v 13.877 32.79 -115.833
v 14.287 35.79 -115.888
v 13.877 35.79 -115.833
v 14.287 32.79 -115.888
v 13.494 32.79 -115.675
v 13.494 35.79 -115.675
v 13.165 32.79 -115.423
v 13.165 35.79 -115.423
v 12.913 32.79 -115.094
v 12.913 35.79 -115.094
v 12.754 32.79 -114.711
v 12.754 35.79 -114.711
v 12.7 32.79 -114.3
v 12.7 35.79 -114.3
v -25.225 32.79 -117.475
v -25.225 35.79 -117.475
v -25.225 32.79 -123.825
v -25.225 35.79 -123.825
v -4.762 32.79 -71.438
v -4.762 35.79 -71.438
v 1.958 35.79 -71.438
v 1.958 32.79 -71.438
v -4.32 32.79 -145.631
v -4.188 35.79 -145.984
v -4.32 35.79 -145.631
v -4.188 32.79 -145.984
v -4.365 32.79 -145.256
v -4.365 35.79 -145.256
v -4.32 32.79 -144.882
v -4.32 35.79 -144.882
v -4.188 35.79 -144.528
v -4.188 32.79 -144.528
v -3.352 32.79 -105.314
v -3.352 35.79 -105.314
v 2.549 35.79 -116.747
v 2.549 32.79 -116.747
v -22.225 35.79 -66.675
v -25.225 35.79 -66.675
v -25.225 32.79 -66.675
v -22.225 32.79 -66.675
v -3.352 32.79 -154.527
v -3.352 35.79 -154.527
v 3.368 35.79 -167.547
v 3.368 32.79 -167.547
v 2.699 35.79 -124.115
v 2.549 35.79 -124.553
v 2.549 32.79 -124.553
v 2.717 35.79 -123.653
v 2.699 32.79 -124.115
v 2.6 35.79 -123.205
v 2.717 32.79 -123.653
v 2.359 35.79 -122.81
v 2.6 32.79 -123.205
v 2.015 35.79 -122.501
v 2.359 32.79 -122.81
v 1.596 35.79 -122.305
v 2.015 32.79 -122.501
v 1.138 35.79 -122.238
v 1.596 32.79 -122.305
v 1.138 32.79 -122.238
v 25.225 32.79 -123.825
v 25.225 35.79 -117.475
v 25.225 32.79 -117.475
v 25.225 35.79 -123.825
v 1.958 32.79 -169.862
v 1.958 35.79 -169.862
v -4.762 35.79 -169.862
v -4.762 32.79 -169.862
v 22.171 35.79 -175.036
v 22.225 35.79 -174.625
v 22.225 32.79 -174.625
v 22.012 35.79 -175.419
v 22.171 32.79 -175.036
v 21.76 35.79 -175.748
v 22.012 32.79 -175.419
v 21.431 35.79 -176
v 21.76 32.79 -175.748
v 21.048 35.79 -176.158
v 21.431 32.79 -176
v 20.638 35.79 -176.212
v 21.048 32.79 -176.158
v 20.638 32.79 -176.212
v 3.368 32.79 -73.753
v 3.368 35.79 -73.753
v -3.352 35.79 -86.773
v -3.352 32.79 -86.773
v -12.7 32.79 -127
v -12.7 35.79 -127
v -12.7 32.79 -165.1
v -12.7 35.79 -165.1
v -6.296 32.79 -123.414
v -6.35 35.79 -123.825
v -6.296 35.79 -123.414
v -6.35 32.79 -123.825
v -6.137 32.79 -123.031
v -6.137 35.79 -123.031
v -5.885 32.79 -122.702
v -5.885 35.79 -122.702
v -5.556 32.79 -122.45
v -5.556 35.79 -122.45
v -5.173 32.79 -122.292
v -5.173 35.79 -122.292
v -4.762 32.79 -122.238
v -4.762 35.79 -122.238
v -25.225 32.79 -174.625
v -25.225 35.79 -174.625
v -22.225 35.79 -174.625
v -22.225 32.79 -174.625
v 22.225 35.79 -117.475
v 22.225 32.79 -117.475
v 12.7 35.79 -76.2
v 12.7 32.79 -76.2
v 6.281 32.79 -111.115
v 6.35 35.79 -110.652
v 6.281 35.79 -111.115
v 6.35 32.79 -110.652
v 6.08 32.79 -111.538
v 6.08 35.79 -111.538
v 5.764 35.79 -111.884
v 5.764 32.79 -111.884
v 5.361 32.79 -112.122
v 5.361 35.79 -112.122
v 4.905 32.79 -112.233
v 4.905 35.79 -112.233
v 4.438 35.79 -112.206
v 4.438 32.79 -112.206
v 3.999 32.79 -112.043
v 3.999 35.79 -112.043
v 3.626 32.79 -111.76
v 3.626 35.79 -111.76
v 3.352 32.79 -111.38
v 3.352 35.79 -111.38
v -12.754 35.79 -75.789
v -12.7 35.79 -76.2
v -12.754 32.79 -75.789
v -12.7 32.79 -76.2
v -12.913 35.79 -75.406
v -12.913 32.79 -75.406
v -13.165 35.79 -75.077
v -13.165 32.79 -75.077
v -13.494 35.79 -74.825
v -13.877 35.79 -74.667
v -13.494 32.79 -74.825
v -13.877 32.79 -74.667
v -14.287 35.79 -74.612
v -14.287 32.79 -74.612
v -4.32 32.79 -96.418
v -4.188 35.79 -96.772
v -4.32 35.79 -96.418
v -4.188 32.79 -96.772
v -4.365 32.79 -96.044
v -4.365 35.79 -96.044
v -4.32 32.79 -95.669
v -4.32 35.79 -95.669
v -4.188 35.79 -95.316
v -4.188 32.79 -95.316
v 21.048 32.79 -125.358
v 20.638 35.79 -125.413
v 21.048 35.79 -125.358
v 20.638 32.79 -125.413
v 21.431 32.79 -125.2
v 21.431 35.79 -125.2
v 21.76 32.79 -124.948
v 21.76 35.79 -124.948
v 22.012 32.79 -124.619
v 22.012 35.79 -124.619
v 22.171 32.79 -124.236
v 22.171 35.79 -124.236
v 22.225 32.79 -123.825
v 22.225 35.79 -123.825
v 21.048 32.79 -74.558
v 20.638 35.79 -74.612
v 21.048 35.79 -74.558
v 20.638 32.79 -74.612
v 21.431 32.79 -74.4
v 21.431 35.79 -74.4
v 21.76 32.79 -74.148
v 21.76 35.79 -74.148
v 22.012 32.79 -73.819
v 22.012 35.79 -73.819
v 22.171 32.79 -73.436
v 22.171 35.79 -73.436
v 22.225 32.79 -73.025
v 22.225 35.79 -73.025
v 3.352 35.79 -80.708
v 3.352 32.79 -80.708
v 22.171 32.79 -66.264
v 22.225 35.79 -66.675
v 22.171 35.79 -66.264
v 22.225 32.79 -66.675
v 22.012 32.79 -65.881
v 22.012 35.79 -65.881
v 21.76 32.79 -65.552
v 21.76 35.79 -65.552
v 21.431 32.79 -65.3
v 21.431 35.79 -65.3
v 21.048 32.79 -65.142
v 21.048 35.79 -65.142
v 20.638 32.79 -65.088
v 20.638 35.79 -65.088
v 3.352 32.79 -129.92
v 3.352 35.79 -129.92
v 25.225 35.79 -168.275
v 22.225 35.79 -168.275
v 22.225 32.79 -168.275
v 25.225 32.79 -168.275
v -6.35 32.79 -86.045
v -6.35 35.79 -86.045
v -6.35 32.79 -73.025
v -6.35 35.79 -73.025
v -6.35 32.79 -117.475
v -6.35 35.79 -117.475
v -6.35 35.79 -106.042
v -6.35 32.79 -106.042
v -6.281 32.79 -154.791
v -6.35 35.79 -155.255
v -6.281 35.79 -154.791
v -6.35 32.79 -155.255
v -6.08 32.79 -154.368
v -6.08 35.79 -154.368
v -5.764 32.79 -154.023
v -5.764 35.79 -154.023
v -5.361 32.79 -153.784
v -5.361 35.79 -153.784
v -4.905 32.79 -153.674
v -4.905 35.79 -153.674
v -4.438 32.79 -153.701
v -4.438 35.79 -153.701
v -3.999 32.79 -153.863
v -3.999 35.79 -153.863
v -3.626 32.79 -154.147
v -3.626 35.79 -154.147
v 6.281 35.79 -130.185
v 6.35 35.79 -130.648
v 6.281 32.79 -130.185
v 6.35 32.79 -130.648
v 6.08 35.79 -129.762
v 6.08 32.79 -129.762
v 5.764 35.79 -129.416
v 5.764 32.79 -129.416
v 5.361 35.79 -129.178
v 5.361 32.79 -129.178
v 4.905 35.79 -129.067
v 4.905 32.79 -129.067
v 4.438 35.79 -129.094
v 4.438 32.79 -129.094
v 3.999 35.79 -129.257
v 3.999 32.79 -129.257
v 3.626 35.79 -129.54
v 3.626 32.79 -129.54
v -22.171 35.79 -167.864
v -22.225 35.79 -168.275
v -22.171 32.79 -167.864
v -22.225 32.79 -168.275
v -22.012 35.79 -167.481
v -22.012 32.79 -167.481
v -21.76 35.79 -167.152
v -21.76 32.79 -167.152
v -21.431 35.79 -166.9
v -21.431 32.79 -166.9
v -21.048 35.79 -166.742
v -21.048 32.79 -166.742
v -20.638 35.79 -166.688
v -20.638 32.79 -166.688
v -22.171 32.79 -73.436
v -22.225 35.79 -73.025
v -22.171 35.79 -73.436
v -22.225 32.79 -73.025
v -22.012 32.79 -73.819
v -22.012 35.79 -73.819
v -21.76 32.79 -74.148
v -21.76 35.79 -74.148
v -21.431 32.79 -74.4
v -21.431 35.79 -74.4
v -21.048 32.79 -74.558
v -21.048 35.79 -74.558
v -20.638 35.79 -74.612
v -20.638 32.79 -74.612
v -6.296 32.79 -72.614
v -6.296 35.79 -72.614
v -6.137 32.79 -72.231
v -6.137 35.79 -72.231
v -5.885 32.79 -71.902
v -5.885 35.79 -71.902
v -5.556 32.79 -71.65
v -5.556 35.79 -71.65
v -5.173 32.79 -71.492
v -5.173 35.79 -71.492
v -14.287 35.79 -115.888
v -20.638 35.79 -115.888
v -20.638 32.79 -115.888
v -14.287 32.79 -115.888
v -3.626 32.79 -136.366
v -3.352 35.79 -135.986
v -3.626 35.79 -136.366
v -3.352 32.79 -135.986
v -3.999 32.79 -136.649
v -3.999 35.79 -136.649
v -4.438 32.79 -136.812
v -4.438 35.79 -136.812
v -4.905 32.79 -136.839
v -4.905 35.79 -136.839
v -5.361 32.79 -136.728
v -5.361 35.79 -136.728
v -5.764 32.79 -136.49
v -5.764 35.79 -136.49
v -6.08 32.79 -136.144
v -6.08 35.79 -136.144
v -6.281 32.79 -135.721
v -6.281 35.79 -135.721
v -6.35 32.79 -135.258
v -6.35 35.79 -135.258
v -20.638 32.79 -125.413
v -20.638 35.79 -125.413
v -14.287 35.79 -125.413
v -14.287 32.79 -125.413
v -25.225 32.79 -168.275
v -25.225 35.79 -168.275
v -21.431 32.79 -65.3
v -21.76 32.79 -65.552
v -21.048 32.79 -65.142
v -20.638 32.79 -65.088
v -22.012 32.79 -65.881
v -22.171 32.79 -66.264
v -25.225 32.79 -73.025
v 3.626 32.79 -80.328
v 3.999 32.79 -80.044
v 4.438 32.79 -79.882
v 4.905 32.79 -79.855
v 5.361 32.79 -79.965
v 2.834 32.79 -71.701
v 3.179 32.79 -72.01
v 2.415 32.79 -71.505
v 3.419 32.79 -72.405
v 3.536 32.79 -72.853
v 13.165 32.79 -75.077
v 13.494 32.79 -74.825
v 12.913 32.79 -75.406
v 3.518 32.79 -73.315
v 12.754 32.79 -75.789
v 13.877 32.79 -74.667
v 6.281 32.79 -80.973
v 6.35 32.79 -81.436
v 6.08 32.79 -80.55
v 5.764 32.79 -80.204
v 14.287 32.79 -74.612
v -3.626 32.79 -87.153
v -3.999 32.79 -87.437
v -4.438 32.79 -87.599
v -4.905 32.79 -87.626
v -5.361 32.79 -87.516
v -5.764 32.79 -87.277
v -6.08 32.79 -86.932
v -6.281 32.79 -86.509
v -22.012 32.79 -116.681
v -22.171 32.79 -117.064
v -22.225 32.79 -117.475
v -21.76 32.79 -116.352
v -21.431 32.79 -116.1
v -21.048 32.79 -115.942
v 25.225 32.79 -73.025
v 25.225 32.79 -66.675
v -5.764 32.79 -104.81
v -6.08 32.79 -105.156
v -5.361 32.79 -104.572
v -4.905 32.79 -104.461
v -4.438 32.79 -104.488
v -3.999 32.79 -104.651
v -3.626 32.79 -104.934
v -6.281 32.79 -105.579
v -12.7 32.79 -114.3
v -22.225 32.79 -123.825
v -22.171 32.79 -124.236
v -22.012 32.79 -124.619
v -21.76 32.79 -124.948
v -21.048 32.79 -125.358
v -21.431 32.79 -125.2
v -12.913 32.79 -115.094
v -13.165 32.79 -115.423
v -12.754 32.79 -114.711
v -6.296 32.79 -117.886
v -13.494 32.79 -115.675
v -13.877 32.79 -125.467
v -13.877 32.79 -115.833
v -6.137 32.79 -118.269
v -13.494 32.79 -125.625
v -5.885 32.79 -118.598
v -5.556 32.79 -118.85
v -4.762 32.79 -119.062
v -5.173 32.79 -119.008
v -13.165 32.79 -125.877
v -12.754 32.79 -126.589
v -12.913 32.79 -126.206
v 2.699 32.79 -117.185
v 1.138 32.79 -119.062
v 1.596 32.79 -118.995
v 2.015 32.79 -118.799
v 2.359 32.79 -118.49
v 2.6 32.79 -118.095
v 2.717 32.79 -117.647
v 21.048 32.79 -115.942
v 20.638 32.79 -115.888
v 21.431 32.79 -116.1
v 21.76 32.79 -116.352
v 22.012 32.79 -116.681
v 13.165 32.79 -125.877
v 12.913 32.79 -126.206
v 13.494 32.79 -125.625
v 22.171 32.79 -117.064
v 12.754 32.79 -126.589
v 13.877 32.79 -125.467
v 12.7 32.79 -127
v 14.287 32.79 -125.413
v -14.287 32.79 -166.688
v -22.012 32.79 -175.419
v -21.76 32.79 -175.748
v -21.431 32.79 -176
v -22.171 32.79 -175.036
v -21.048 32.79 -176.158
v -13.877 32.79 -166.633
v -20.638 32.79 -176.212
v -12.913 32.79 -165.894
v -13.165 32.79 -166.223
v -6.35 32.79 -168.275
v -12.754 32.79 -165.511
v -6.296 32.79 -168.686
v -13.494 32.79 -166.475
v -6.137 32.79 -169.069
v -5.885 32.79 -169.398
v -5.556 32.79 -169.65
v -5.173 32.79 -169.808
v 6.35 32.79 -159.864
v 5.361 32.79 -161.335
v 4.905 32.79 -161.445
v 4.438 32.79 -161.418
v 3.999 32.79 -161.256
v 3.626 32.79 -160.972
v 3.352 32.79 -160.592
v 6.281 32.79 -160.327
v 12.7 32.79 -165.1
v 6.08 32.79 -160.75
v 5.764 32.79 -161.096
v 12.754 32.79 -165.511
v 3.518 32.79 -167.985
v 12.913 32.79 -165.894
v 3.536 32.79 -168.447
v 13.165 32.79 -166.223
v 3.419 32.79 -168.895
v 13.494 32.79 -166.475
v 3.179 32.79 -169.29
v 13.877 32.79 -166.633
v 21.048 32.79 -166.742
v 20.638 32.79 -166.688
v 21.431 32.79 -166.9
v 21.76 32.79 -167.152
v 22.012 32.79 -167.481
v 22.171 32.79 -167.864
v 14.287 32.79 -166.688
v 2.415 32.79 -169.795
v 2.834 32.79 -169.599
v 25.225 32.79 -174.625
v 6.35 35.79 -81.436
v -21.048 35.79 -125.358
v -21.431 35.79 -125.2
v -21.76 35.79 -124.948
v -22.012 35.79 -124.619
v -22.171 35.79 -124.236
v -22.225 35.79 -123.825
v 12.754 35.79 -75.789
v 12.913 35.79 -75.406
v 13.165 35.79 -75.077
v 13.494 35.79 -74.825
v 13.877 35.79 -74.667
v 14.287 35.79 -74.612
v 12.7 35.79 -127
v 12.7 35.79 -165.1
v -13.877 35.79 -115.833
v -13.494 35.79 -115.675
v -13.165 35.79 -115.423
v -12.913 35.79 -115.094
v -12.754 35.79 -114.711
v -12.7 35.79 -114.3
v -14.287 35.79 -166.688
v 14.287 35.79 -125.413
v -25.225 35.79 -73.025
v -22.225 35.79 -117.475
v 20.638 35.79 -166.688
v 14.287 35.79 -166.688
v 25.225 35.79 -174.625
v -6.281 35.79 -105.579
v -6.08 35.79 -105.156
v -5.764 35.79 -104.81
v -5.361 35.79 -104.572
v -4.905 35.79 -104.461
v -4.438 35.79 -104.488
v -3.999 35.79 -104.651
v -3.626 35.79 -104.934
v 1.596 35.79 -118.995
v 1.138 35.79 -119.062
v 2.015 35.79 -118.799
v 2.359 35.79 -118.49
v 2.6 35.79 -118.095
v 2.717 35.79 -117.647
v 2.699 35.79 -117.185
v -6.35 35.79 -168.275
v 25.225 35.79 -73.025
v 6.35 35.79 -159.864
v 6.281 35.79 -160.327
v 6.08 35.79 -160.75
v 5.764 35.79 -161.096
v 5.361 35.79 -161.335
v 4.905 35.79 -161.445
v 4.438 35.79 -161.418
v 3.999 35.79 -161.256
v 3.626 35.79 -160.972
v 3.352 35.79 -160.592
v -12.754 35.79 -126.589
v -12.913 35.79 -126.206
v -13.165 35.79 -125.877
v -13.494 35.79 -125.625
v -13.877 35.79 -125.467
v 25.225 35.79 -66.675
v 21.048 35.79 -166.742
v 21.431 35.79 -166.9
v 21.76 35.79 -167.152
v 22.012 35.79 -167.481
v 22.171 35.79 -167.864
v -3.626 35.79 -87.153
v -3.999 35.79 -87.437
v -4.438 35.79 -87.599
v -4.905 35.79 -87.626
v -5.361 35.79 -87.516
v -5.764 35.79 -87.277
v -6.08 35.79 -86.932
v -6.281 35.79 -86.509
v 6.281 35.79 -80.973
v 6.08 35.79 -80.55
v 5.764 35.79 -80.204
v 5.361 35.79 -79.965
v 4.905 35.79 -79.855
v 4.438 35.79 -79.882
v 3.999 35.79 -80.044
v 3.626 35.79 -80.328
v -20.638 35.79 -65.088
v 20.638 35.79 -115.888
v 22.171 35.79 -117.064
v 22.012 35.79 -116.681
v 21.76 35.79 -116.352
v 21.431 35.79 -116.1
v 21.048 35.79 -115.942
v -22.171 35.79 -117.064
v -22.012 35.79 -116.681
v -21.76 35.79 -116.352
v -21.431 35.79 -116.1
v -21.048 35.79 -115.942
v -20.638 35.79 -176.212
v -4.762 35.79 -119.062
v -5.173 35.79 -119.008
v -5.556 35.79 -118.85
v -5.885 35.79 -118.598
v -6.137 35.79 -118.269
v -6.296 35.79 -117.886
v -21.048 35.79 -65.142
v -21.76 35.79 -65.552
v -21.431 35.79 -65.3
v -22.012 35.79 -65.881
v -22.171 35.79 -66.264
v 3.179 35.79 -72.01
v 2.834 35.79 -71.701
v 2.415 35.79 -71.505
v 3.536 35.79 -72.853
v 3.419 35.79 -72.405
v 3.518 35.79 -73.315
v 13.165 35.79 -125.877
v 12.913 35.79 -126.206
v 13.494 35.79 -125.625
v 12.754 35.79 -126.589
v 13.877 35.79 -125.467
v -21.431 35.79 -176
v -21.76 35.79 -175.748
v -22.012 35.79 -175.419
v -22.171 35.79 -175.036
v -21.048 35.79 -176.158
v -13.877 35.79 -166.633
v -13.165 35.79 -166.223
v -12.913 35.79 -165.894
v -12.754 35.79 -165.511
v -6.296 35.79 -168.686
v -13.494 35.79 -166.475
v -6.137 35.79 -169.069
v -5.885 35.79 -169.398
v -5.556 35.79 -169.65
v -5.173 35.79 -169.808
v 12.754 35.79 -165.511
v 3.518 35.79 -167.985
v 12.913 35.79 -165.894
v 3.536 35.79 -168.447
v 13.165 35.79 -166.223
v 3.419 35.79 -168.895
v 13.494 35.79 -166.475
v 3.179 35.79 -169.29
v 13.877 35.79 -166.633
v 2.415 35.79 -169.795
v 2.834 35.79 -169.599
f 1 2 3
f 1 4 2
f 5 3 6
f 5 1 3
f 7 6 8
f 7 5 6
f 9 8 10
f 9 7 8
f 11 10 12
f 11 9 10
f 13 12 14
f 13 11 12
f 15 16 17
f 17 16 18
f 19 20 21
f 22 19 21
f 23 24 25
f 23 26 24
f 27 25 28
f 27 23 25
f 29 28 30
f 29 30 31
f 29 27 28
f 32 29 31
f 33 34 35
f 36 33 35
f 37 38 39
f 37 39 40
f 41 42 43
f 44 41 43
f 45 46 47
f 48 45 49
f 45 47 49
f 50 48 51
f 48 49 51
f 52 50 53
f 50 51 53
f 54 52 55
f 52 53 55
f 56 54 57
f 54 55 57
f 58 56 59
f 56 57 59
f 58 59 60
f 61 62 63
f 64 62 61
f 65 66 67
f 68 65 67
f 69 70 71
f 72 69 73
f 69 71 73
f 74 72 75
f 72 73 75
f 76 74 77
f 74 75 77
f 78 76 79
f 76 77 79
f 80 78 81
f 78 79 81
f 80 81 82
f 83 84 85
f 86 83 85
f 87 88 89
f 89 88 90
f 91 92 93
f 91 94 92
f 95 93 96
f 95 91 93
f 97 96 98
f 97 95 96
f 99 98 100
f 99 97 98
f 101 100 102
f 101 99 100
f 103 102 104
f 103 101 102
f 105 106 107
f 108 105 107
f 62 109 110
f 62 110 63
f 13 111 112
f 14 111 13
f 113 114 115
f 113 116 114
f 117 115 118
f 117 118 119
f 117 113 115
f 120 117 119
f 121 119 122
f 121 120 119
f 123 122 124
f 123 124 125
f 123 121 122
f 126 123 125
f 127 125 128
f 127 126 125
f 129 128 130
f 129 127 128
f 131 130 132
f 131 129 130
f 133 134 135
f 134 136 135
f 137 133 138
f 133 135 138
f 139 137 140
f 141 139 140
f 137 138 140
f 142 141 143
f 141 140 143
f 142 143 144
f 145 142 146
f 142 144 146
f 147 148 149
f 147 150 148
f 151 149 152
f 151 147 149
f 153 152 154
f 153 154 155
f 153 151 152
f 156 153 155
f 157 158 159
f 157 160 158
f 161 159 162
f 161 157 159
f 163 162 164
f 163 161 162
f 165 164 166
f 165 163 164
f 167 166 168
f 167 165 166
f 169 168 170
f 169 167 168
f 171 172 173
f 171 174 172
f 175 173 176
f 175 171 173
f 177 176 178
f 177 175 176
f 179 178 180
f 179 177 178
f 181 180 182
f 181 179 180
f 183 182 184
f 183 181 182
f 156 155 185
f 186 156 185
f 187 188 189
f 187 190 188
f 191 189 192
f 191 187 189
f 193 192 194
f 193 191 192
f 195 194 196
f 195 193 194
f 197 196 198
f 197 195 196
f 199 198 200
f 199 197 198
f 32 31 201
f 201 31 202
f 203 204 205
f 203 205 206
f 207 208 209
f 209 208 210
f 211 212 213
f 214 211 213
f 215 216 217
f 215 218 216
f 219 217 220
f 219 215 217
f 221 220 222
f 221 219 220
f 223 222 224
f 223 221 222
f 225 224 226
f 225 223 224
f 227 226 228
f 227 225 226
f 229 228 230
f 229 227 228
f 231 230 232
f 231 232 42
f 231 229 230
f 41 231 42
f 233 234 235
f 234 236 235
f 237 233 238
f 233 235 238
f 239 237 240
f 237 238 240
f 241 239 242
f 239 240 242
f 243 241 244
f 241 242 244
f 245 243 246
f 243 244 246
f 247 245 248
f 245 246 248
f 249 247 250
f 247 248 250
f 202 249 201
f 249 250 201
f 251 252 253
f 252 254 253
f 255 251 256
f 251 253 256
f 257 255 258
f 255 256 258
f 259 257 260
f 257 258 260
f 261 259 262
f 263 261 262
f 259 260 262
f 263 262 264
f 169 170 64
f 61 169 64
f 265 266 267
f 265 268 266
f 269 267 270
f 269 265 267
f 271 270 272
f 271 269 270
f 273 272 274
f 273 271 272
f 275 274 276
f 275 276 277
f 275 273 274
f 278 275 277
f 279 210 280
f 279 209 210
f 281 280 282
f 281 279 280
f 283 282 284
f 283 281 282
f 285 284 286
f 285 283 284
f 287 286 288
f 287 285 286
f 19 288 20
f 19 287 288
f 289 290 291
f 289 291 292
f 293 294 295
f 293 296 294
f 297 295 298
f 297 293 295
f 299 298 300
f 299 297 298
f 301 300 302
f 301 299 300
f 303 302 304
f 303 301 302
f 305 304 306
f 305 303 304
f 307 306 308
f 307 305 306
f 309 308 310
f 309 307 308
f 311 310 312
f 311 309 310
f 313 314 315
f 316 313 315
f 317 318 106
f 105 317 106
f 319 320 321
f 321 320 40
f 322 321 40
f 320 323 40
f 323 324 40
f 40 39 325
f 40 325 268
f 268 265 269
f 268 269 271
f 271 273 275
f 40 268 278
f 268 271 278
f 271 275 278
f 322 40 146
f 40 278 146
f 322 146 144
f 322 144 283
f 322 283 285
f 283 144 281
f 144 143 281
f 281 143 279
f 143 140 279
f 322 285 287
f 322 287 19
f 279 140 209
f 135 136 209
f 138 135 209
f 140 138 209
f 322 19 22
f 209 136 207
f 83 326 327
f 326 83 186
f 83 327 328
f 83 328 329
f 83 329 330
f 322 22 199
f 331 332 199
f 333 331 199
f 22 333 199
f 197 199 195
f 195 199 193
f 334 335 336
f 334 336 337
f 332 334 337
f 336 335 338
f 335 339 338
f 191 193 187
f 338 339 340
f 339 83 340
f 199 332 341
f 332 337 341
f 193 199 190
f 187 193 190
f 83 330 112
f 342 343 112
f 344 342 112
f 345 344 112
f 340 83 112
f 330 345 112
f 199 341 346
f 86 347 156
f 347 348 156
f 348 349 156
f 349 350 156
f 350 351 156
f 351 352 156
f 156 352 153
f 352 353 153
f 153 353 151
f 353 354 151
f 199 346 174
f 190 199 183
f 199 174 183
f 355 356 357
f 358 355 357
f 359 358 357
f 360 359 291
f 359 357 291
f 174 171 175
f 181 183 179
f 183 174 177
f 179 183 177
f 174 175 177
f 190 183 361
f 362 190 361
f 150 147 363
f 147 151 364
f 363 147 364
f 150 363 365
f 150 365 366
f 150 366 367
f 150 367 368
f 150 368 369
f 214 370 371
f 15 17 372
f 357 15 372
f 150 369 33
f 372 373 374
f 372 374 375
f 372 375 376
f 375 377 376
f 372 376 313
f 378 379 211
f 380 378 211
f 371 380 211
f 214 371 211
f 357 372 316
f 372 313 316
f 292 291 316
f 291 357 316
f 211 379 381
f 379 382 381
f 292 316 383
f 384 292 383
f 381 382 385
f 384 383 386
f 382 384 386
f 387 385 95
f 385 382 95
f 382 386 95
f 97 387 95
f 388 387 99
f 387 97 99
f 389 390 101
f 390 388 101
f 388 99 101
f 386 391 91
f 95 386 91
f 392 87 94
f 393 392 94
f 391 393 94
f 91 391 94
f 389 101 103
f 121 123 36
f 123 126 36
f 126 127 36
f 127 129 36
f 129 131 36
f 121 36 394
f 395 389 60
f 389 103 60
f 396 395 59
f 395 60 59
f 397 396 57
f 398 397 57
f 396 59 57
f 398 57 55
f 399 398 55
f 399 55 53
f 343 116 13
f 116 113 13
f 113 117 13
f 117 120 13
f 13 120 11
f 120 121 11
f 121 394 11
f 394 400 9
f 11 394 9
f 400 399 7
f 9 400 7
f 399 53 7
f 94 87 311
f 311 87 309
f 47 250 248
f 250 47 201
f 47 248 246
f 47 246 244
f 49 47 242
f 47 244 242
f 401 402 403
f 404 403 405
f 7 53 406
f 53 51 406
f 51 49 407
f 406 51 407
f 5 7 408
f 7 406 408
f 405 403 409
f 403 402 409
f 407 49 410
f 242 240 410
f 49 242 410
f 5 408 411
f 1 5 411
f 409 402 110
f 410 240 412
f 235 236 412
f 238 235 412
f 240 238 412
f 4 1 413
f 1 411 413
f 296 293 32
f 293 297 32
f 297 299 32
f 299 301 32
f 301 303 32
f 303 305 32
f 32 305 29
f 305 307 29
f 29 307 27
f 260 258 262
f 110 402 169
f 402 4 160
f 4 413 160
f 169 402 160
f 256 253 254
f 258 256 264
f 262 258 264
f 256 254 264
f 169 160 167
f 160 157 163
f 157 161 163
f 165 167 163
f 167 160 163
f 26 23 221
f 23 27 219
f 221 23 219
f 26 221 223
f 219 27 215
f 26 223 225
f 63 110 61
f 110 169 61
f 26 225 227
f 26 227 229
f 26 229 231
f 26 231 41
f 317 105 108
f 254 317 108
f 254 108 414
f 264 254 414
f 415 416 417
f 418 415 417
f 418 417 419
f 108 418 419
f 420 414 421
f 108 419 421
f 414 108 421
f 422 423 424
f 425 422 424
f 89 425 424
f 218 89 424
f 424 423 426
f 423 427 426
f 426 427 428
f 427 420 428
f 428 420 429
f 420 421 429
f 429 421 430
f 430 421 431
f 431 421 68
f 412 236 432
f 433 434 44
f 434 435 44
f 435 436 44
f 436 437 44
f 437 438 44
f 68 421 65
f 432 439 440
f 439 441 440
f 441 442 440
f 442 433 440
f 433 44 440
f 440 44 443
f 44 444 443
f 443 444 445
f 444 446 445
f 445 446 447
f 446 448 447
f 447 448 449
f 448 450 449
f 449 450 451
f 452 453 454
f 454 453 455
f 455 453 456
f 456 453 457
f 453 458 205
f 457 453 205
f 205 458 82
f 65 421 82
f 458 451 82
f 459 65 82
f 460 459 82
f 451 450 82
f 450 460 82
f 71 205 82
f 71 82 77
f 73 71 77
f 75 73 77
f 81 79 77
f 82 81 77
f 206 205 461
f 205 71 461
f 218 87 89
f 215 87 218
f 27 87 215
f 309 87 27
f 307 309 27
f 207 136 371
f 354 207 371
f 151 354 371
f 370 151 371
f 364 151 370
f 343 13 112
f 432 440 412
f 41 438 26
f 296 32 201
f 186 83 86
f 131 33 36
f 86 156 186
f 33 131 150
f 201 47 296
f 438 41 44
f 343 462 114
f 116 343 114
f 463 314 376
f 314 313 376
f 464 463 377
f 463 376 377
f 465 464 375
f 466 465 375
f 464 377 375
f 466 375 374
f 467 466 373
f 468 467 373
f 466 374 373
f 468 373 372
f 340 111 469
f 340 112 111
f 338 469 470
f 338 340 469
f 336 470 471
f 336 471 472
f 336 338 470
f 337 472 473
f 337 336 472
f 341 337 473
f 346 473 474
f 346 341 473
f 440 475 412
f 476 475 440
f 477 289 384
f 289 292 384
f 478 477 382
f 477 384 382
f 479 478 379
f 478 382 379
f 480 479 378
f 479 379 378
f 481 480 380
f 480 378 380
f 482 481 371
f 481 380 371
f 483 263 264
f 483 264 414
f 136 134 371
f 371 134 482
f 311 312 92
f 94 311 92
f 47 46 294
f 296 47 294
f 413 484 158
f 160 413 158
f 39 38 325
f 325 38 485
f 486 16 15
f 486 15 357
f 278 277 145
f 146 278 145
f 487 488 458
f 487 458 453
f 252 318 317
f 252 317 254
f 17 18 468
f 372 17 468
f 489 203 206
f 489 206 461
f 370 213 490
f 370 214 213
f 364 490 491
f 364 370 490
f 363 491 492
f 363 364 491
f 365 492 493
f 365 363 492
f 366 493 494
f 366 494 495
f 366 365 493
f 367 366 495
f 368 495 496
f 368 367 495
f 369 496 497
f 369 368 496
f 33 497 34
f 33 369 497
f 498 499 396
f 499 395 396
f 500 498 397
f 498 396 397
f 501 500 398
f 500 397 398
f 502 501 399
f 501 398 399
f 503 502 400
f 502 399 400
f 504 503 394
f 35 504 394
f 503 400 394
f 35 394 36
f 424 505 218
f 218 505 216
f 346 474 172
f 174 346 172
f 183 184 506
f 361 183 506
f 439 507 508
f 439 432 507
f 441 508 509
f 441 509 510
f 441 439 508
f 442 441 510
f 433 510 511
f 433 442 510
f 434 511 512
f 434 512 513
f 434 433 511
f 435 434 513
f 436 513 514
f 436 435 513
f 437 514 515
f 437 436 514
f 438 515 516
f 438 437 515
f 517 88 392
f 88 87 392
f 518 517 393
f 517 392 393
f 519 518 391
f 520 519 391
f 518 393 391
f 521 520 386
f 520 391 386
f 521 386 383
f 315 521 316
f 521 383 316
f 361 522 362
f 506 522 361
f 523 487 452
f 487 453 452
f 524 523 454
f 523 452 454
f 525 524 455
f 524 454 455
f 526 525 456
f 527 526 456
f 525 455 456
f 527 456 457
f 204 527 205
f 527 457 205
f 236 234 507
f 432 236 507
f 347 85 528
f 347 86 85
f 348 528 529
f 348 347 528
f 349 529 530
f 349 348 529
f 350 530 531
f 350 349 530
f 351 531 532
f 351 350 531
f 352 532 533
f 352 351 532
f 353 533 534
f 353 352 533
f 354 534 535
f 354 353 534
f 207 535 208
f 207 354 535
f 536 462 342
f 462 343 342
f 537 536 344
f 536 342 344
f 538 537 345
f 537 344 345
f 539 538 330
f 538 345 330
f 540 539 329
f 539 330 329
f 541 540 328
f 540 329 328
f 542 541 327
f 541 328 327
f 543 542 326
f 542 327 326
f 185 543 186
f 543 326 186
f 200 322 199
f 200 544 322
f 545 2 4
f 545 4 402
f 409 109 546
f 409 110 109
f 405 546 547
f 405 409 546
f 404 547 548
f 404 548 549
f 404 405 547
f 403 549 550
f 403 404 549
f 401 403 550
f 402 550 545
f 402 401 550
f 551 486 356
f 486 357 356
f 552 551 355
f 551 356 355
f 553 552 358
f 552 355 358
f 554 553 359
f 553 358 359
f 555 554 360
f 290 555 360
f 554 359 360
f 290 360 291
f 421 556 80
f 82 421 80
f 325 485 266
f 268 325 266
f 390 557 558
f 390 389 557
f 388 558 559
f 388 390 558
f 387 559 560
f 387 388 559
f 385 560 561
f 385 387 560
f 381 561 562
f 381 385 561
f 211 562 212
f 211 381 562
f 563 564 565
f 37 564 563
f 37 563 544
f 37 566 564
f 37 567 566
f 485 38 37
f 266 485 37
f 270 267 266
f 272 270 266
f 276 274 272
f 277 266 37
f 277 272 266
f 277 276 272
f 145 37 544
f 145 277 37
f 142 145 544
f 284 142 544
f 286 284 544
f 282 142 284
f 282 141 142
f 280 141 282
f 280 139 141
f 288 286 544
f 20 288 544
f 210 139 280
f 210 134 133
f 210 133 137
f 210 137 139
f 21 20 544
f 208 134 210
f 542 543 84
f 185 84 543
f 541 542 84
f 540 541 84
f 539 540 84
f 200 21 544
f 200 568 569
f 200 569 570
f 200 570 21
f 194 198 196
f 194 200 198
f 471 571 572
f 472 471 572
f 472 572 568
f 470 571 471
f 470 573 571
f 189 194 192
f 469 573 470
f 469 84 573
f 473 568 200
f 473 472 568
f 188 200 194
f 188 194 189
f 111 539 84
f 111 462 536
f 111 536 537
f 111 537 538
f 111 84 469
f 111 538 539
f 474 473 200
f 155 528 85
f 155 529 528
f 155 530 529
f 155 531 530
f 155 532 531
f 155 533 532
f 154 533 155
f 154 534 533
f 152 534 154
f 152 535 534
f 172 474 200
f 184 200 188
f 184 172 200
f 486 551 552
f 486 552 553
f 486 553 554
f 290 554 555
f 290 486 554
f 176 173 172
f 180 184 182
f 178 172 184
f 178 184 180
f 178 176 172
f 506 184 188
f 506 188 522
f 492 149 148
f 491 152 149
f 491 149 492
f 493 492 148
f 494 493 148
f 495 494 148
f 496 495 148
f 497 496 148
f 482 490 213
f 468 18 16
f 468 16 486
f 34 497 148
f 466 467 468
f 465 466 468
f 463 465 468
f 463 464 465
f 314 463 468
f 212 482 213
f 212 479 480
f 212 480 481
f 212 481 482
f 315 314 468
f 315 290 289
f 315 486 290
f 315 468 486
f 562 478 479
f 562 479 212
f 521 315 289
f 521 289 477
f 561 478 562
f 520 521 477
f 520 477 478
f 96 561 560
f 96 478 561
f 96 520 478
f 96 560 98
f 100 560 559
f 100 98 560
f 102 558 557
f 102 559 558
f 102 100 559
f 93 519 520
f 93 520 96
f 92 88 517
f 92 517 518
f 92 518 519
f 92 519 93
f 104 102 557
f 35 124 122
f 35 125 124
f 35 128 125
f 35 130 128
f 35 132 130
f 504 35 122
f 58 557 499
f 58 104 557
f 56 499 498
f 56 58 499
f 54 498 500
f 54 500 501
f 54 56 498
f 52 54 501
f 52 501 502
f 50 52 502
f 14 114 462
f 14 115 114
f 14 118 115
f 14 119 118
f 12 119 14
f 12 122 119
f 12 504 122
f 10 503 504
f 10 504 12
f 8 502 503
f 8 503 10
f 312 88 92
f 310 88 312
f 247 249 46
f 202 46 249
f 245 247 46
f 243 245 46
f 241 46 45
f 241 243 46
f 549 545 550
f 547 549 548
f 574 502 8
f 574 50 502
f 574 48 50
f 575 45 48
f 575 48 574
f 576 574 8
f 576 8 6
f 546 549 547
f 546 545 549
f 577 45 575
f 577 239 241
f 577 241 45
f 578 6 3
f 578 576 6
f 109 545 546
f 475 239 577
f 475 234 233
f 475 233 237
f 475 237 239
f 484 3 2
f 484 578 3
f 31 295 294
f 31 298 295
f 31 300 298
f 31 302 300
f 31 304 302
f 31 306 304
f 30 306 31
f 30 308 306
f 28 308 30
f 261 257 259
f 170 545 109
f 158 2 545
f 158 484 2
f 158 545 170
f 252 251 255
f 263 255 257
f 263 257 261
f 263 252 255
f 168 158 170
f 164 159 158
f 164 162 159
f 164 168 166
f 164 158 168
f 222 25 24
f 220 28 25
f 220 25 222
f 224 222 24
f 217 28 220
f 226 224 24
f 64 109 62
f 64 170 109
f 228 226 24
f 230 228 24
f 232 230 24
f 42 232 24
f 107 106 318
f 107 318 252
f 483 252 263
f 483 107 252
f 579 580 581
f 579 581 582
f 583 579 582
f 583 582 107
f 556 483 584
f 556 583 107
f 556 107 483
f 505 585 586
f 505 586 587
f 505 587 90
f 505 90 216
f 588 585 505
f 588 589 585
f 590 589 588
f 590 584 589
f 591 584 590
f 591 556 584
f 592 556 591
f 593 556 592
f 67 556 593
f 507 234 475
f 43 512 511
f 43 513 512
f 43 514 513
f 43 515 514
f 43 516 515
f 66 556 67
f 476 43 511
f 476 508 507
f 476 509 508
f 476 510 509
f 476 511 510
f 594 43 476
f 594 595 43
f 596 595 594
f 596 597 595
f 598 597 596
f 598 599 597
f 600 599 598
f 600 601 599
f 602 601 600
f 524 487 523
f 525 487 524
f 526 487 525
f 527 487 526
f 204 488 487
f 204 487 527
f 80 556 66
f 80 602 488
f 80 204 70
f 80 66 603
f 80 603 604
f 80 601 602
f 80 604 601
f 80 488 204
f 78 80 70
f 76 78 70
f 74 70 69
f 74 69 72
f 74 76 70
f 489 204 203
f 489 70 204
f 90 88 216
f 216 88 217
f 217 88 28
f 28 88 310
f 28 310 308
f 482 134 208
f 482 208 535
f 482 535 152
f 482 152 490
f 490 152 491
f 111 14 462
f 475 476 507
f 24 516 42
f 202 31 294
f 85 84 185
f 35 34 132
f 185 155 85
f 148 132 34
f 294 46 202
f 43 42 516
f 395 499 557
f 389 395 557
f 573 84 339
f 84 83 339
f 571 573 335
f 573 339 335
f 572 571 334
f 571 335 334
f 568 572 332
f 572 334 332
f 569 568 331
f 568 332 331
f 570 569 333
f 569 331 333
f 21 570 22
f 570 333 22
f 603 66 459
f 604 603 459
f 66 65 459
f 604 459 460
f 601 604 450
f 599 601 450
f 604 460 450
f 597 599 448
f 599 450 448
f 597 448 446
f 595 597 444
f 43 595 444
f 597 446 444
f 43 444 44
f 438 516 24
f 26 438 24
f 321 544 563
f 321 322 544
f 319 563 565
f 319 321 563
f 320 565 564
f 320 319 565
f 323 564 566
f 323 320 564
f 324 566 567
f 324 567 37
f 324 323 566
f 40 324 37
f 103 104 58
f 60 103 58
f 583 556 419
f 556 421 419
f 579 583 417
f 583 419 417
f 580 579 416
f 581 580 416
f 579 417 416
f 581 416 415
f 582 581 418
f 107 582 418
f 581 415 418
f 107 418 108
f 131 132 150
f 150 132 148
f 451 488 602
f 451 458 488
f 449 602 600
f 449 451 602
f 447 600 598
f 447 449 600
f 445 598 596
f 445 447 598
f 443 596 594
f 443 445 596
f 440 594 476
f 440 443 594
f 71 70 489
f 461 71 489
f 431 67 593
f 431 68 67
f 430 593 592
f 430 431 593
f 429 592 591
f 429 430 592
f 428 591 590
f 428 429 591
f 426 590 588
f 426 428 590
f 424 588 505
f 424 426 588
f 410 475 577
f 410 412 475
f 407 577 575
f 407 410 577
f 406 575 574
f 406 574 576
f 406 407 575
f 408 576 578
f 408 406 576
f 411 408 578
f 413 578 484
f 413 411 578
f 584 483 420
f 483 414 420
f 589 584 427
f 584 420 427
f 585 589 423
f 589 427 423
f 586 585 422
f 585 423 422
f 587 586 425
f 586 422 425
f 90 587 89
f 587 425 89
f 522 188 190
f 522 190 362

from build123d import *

# Parameters (mm, degrees)
SKETCH1_W           = 25.4
SKETCH1_H           = 111.125
BOSS_EXTRUDE1_DEPTH = 1.5
SKETCH2_W           = 9.525
SKETCH2_H           = 9.525
BOSS_EXTRUDE2_DEPTH = 3
CUT_EXTRUDE1_DEPTH  = 178.633881287
FILLET1_R           = 1.5875
SKETCH5_W           = 3
SKETCH5_H           = 6.35
BOSS_EXTRUDE3_DEPTH = 3


with BuildPart() as part:
    # Sketch1 → Boss-Extrude1 (new, symmetric)
    with BuildSketch(Plane(origin=(0, 34.29, 0), x_dir=(1, 0, 0), z_dir=(0, 1, 0))):
        with Locations((0, 120.65)):
            Rectangle(SKETCH1_W, SKETCH1_H)
    extrude(amount=BOSS_EXTRUDE1_DEPTH, both=True)

    # Sketch2 → Boss-Extrude2 (add)
    with BuildSketch(Plane(origin=(0, 35.79, 0), x_dir=(1, 0, 0), z_dir=(0, 1, 0))):
        with Locations((17.4625, 171.45)):
            Rectangle(SKETCH2_W, SKETCH2_H)
        with Locations((-17.4625, 171.45)):
            Rectangle(SKETCH2_W, SKETCH2_H)
        with Locations((17.4625, 120.65)):
            Rectangle(SKETCH2_W, SKETCH2_H)
        with Locations((-17.4625, 120.65)):
            Rectangle(SKETCH2_W, SKETCH2_H)
        with Locations((17.4625, 69.85)):
            Rectangle(SKETCH2_W, SKETCH2_H)
        with Locations((-17.4625, 69.85)):
            Rectangle(SKETCH2_W, SKETCH2_H)
    extrude(amount=-BOSS_EXTRUDE2_DEPTH)

    # Sketch4 → Cut-Extrude1 (cut, through all)
    with BuildSketch(Plane(origin=(0, 35.79, 0), x_dir=(1, 0, 0), z_dir=(0, 1, 0))):
        Polygon((4.563523411, 71.4375), (-6.35, 92.58245161), (-6.35, 71.4375), align=None)
        Polygon((6.35, 74.89879839), (6.35, 117.18870161), (-4.563523411, 96.04375), align=None)
        Polygon((3.744168573, 119.0625), (-6.35, 119.0625), (-6.35, 99.50504839), align=None)
        Polygon((3.744168573, 122.2375), (-6.35, 141.79495161), (-6.35, 122.2375), align=None)
        Polygon((6.35, 124.11129839), (6.35, 166.40120161), (-4.563523411, 145.25625), align=None)
        Polygon((4.563523411, 169.8625), (-6.35, 169.8625), (-6.35, 148.71754839), align=None)
    extrude(amount=-CUT_EXTRUDE1_DEPTH, mode=Mode.SUBTRACT)

    # Fillet1
    fillet1_edges = [part.edges().sort_by_distance(p)[0] for p in [
        (3.744168573, 34.29, -119.0625),
        (-6.35, 34.29, -99.50504839),
        (-6.35, 34.29, -119.0625),
        (-4.563523411, 34.29, -96.04375),
        (6.35, 34.29, -117.18870161),
        (6.35, 34.29, -74.89879839),
        (-4.563523411, 34.29, -145.25625),
        (6.35, 34.29, -166.40120161),
        (6.35, 34.29, -124.11129839),
        (3.744168573, 34.29, -122.2375),
        (-6.35, 34.29, -122.2375),
        (-6.35, 34.29, -141.79495161),
        (-6.35, 34.29, -148.71754839),
        (-6.35, 34.29, -169.8625),
        (4.563523411, 34.29, -169.8625),
        (4.563523411, 34.29, -71.4375),
        (-6.35, 34.29, -71.4375),
        (-6.35, 34.29, -92.58245161),
        (22.225, 34.29, -65.0875),
        (22.225, 34.29, -74.6125),
        (12.7, 34.29, -74.6125),
        (-12.7, 34.29, -115.8875),
        (-12.7, 34.29, -125.4125),
        (-22.225, 34.29, -125.4125),
        (-22.225, 34.29, -115.8875),
        (22.225, 34.29, -115.8875),
        (22.225, 34.29, -125.4125),
        (12.7, 34.29, -125.4125),
        (12.7, 34.29, -115.8875),
        (-12.7, 34.29, -166.6875),
        (-22.225, 34.29, -176.2125),
        (-22.225, 34.29, -166.6875),
        (-12.7, 34.29, -74.6125),
        (-22.225, 34.29, -74.6125),
        (-22.225, 34.29, -65.0875),
        (22.225, 34.29, -166.6875),
        (22.225, 34.29, -176.2125),
        (12.7, 34.29, -166.6875),
    ]]
    fillet(fillet1_edges, radius=FILLET1_R)

    # Sketch5 → Boss-Extrude3 (add)
    with BuildSketch(Plane(origin=(0, 35.79, 0), x_dir=(1, 0, 0), z_dir=(0, 1, 0))):
        with Locations((23.725, 171.45)):
            Rectangle(SKETCH5_W, SKETCH5_H)
        with Locations((-23.725, 171.45)):
            Rectangle(SKETCH5_W, SKETCH5_H)
        with Locations((23.725, 120.65)):
            Rectangle(SKETCH5_W, SKETCH5_H)
        with Locations((-23.725, 120.65)):
            Rectangle(SKETCH5_W, SKETCH5_H)
        with Locations((23.725, 69.85)):
            Rectangle(SKETCH5_W, SKETCH5_H)
        with Locations((-23.725, 69.85)):
            Rectangle(SKETCH5_W, SKETCH5_H)
    extrude(amount=-BOSS_EXTRUDE3_DEPTH)


solid = part.part
